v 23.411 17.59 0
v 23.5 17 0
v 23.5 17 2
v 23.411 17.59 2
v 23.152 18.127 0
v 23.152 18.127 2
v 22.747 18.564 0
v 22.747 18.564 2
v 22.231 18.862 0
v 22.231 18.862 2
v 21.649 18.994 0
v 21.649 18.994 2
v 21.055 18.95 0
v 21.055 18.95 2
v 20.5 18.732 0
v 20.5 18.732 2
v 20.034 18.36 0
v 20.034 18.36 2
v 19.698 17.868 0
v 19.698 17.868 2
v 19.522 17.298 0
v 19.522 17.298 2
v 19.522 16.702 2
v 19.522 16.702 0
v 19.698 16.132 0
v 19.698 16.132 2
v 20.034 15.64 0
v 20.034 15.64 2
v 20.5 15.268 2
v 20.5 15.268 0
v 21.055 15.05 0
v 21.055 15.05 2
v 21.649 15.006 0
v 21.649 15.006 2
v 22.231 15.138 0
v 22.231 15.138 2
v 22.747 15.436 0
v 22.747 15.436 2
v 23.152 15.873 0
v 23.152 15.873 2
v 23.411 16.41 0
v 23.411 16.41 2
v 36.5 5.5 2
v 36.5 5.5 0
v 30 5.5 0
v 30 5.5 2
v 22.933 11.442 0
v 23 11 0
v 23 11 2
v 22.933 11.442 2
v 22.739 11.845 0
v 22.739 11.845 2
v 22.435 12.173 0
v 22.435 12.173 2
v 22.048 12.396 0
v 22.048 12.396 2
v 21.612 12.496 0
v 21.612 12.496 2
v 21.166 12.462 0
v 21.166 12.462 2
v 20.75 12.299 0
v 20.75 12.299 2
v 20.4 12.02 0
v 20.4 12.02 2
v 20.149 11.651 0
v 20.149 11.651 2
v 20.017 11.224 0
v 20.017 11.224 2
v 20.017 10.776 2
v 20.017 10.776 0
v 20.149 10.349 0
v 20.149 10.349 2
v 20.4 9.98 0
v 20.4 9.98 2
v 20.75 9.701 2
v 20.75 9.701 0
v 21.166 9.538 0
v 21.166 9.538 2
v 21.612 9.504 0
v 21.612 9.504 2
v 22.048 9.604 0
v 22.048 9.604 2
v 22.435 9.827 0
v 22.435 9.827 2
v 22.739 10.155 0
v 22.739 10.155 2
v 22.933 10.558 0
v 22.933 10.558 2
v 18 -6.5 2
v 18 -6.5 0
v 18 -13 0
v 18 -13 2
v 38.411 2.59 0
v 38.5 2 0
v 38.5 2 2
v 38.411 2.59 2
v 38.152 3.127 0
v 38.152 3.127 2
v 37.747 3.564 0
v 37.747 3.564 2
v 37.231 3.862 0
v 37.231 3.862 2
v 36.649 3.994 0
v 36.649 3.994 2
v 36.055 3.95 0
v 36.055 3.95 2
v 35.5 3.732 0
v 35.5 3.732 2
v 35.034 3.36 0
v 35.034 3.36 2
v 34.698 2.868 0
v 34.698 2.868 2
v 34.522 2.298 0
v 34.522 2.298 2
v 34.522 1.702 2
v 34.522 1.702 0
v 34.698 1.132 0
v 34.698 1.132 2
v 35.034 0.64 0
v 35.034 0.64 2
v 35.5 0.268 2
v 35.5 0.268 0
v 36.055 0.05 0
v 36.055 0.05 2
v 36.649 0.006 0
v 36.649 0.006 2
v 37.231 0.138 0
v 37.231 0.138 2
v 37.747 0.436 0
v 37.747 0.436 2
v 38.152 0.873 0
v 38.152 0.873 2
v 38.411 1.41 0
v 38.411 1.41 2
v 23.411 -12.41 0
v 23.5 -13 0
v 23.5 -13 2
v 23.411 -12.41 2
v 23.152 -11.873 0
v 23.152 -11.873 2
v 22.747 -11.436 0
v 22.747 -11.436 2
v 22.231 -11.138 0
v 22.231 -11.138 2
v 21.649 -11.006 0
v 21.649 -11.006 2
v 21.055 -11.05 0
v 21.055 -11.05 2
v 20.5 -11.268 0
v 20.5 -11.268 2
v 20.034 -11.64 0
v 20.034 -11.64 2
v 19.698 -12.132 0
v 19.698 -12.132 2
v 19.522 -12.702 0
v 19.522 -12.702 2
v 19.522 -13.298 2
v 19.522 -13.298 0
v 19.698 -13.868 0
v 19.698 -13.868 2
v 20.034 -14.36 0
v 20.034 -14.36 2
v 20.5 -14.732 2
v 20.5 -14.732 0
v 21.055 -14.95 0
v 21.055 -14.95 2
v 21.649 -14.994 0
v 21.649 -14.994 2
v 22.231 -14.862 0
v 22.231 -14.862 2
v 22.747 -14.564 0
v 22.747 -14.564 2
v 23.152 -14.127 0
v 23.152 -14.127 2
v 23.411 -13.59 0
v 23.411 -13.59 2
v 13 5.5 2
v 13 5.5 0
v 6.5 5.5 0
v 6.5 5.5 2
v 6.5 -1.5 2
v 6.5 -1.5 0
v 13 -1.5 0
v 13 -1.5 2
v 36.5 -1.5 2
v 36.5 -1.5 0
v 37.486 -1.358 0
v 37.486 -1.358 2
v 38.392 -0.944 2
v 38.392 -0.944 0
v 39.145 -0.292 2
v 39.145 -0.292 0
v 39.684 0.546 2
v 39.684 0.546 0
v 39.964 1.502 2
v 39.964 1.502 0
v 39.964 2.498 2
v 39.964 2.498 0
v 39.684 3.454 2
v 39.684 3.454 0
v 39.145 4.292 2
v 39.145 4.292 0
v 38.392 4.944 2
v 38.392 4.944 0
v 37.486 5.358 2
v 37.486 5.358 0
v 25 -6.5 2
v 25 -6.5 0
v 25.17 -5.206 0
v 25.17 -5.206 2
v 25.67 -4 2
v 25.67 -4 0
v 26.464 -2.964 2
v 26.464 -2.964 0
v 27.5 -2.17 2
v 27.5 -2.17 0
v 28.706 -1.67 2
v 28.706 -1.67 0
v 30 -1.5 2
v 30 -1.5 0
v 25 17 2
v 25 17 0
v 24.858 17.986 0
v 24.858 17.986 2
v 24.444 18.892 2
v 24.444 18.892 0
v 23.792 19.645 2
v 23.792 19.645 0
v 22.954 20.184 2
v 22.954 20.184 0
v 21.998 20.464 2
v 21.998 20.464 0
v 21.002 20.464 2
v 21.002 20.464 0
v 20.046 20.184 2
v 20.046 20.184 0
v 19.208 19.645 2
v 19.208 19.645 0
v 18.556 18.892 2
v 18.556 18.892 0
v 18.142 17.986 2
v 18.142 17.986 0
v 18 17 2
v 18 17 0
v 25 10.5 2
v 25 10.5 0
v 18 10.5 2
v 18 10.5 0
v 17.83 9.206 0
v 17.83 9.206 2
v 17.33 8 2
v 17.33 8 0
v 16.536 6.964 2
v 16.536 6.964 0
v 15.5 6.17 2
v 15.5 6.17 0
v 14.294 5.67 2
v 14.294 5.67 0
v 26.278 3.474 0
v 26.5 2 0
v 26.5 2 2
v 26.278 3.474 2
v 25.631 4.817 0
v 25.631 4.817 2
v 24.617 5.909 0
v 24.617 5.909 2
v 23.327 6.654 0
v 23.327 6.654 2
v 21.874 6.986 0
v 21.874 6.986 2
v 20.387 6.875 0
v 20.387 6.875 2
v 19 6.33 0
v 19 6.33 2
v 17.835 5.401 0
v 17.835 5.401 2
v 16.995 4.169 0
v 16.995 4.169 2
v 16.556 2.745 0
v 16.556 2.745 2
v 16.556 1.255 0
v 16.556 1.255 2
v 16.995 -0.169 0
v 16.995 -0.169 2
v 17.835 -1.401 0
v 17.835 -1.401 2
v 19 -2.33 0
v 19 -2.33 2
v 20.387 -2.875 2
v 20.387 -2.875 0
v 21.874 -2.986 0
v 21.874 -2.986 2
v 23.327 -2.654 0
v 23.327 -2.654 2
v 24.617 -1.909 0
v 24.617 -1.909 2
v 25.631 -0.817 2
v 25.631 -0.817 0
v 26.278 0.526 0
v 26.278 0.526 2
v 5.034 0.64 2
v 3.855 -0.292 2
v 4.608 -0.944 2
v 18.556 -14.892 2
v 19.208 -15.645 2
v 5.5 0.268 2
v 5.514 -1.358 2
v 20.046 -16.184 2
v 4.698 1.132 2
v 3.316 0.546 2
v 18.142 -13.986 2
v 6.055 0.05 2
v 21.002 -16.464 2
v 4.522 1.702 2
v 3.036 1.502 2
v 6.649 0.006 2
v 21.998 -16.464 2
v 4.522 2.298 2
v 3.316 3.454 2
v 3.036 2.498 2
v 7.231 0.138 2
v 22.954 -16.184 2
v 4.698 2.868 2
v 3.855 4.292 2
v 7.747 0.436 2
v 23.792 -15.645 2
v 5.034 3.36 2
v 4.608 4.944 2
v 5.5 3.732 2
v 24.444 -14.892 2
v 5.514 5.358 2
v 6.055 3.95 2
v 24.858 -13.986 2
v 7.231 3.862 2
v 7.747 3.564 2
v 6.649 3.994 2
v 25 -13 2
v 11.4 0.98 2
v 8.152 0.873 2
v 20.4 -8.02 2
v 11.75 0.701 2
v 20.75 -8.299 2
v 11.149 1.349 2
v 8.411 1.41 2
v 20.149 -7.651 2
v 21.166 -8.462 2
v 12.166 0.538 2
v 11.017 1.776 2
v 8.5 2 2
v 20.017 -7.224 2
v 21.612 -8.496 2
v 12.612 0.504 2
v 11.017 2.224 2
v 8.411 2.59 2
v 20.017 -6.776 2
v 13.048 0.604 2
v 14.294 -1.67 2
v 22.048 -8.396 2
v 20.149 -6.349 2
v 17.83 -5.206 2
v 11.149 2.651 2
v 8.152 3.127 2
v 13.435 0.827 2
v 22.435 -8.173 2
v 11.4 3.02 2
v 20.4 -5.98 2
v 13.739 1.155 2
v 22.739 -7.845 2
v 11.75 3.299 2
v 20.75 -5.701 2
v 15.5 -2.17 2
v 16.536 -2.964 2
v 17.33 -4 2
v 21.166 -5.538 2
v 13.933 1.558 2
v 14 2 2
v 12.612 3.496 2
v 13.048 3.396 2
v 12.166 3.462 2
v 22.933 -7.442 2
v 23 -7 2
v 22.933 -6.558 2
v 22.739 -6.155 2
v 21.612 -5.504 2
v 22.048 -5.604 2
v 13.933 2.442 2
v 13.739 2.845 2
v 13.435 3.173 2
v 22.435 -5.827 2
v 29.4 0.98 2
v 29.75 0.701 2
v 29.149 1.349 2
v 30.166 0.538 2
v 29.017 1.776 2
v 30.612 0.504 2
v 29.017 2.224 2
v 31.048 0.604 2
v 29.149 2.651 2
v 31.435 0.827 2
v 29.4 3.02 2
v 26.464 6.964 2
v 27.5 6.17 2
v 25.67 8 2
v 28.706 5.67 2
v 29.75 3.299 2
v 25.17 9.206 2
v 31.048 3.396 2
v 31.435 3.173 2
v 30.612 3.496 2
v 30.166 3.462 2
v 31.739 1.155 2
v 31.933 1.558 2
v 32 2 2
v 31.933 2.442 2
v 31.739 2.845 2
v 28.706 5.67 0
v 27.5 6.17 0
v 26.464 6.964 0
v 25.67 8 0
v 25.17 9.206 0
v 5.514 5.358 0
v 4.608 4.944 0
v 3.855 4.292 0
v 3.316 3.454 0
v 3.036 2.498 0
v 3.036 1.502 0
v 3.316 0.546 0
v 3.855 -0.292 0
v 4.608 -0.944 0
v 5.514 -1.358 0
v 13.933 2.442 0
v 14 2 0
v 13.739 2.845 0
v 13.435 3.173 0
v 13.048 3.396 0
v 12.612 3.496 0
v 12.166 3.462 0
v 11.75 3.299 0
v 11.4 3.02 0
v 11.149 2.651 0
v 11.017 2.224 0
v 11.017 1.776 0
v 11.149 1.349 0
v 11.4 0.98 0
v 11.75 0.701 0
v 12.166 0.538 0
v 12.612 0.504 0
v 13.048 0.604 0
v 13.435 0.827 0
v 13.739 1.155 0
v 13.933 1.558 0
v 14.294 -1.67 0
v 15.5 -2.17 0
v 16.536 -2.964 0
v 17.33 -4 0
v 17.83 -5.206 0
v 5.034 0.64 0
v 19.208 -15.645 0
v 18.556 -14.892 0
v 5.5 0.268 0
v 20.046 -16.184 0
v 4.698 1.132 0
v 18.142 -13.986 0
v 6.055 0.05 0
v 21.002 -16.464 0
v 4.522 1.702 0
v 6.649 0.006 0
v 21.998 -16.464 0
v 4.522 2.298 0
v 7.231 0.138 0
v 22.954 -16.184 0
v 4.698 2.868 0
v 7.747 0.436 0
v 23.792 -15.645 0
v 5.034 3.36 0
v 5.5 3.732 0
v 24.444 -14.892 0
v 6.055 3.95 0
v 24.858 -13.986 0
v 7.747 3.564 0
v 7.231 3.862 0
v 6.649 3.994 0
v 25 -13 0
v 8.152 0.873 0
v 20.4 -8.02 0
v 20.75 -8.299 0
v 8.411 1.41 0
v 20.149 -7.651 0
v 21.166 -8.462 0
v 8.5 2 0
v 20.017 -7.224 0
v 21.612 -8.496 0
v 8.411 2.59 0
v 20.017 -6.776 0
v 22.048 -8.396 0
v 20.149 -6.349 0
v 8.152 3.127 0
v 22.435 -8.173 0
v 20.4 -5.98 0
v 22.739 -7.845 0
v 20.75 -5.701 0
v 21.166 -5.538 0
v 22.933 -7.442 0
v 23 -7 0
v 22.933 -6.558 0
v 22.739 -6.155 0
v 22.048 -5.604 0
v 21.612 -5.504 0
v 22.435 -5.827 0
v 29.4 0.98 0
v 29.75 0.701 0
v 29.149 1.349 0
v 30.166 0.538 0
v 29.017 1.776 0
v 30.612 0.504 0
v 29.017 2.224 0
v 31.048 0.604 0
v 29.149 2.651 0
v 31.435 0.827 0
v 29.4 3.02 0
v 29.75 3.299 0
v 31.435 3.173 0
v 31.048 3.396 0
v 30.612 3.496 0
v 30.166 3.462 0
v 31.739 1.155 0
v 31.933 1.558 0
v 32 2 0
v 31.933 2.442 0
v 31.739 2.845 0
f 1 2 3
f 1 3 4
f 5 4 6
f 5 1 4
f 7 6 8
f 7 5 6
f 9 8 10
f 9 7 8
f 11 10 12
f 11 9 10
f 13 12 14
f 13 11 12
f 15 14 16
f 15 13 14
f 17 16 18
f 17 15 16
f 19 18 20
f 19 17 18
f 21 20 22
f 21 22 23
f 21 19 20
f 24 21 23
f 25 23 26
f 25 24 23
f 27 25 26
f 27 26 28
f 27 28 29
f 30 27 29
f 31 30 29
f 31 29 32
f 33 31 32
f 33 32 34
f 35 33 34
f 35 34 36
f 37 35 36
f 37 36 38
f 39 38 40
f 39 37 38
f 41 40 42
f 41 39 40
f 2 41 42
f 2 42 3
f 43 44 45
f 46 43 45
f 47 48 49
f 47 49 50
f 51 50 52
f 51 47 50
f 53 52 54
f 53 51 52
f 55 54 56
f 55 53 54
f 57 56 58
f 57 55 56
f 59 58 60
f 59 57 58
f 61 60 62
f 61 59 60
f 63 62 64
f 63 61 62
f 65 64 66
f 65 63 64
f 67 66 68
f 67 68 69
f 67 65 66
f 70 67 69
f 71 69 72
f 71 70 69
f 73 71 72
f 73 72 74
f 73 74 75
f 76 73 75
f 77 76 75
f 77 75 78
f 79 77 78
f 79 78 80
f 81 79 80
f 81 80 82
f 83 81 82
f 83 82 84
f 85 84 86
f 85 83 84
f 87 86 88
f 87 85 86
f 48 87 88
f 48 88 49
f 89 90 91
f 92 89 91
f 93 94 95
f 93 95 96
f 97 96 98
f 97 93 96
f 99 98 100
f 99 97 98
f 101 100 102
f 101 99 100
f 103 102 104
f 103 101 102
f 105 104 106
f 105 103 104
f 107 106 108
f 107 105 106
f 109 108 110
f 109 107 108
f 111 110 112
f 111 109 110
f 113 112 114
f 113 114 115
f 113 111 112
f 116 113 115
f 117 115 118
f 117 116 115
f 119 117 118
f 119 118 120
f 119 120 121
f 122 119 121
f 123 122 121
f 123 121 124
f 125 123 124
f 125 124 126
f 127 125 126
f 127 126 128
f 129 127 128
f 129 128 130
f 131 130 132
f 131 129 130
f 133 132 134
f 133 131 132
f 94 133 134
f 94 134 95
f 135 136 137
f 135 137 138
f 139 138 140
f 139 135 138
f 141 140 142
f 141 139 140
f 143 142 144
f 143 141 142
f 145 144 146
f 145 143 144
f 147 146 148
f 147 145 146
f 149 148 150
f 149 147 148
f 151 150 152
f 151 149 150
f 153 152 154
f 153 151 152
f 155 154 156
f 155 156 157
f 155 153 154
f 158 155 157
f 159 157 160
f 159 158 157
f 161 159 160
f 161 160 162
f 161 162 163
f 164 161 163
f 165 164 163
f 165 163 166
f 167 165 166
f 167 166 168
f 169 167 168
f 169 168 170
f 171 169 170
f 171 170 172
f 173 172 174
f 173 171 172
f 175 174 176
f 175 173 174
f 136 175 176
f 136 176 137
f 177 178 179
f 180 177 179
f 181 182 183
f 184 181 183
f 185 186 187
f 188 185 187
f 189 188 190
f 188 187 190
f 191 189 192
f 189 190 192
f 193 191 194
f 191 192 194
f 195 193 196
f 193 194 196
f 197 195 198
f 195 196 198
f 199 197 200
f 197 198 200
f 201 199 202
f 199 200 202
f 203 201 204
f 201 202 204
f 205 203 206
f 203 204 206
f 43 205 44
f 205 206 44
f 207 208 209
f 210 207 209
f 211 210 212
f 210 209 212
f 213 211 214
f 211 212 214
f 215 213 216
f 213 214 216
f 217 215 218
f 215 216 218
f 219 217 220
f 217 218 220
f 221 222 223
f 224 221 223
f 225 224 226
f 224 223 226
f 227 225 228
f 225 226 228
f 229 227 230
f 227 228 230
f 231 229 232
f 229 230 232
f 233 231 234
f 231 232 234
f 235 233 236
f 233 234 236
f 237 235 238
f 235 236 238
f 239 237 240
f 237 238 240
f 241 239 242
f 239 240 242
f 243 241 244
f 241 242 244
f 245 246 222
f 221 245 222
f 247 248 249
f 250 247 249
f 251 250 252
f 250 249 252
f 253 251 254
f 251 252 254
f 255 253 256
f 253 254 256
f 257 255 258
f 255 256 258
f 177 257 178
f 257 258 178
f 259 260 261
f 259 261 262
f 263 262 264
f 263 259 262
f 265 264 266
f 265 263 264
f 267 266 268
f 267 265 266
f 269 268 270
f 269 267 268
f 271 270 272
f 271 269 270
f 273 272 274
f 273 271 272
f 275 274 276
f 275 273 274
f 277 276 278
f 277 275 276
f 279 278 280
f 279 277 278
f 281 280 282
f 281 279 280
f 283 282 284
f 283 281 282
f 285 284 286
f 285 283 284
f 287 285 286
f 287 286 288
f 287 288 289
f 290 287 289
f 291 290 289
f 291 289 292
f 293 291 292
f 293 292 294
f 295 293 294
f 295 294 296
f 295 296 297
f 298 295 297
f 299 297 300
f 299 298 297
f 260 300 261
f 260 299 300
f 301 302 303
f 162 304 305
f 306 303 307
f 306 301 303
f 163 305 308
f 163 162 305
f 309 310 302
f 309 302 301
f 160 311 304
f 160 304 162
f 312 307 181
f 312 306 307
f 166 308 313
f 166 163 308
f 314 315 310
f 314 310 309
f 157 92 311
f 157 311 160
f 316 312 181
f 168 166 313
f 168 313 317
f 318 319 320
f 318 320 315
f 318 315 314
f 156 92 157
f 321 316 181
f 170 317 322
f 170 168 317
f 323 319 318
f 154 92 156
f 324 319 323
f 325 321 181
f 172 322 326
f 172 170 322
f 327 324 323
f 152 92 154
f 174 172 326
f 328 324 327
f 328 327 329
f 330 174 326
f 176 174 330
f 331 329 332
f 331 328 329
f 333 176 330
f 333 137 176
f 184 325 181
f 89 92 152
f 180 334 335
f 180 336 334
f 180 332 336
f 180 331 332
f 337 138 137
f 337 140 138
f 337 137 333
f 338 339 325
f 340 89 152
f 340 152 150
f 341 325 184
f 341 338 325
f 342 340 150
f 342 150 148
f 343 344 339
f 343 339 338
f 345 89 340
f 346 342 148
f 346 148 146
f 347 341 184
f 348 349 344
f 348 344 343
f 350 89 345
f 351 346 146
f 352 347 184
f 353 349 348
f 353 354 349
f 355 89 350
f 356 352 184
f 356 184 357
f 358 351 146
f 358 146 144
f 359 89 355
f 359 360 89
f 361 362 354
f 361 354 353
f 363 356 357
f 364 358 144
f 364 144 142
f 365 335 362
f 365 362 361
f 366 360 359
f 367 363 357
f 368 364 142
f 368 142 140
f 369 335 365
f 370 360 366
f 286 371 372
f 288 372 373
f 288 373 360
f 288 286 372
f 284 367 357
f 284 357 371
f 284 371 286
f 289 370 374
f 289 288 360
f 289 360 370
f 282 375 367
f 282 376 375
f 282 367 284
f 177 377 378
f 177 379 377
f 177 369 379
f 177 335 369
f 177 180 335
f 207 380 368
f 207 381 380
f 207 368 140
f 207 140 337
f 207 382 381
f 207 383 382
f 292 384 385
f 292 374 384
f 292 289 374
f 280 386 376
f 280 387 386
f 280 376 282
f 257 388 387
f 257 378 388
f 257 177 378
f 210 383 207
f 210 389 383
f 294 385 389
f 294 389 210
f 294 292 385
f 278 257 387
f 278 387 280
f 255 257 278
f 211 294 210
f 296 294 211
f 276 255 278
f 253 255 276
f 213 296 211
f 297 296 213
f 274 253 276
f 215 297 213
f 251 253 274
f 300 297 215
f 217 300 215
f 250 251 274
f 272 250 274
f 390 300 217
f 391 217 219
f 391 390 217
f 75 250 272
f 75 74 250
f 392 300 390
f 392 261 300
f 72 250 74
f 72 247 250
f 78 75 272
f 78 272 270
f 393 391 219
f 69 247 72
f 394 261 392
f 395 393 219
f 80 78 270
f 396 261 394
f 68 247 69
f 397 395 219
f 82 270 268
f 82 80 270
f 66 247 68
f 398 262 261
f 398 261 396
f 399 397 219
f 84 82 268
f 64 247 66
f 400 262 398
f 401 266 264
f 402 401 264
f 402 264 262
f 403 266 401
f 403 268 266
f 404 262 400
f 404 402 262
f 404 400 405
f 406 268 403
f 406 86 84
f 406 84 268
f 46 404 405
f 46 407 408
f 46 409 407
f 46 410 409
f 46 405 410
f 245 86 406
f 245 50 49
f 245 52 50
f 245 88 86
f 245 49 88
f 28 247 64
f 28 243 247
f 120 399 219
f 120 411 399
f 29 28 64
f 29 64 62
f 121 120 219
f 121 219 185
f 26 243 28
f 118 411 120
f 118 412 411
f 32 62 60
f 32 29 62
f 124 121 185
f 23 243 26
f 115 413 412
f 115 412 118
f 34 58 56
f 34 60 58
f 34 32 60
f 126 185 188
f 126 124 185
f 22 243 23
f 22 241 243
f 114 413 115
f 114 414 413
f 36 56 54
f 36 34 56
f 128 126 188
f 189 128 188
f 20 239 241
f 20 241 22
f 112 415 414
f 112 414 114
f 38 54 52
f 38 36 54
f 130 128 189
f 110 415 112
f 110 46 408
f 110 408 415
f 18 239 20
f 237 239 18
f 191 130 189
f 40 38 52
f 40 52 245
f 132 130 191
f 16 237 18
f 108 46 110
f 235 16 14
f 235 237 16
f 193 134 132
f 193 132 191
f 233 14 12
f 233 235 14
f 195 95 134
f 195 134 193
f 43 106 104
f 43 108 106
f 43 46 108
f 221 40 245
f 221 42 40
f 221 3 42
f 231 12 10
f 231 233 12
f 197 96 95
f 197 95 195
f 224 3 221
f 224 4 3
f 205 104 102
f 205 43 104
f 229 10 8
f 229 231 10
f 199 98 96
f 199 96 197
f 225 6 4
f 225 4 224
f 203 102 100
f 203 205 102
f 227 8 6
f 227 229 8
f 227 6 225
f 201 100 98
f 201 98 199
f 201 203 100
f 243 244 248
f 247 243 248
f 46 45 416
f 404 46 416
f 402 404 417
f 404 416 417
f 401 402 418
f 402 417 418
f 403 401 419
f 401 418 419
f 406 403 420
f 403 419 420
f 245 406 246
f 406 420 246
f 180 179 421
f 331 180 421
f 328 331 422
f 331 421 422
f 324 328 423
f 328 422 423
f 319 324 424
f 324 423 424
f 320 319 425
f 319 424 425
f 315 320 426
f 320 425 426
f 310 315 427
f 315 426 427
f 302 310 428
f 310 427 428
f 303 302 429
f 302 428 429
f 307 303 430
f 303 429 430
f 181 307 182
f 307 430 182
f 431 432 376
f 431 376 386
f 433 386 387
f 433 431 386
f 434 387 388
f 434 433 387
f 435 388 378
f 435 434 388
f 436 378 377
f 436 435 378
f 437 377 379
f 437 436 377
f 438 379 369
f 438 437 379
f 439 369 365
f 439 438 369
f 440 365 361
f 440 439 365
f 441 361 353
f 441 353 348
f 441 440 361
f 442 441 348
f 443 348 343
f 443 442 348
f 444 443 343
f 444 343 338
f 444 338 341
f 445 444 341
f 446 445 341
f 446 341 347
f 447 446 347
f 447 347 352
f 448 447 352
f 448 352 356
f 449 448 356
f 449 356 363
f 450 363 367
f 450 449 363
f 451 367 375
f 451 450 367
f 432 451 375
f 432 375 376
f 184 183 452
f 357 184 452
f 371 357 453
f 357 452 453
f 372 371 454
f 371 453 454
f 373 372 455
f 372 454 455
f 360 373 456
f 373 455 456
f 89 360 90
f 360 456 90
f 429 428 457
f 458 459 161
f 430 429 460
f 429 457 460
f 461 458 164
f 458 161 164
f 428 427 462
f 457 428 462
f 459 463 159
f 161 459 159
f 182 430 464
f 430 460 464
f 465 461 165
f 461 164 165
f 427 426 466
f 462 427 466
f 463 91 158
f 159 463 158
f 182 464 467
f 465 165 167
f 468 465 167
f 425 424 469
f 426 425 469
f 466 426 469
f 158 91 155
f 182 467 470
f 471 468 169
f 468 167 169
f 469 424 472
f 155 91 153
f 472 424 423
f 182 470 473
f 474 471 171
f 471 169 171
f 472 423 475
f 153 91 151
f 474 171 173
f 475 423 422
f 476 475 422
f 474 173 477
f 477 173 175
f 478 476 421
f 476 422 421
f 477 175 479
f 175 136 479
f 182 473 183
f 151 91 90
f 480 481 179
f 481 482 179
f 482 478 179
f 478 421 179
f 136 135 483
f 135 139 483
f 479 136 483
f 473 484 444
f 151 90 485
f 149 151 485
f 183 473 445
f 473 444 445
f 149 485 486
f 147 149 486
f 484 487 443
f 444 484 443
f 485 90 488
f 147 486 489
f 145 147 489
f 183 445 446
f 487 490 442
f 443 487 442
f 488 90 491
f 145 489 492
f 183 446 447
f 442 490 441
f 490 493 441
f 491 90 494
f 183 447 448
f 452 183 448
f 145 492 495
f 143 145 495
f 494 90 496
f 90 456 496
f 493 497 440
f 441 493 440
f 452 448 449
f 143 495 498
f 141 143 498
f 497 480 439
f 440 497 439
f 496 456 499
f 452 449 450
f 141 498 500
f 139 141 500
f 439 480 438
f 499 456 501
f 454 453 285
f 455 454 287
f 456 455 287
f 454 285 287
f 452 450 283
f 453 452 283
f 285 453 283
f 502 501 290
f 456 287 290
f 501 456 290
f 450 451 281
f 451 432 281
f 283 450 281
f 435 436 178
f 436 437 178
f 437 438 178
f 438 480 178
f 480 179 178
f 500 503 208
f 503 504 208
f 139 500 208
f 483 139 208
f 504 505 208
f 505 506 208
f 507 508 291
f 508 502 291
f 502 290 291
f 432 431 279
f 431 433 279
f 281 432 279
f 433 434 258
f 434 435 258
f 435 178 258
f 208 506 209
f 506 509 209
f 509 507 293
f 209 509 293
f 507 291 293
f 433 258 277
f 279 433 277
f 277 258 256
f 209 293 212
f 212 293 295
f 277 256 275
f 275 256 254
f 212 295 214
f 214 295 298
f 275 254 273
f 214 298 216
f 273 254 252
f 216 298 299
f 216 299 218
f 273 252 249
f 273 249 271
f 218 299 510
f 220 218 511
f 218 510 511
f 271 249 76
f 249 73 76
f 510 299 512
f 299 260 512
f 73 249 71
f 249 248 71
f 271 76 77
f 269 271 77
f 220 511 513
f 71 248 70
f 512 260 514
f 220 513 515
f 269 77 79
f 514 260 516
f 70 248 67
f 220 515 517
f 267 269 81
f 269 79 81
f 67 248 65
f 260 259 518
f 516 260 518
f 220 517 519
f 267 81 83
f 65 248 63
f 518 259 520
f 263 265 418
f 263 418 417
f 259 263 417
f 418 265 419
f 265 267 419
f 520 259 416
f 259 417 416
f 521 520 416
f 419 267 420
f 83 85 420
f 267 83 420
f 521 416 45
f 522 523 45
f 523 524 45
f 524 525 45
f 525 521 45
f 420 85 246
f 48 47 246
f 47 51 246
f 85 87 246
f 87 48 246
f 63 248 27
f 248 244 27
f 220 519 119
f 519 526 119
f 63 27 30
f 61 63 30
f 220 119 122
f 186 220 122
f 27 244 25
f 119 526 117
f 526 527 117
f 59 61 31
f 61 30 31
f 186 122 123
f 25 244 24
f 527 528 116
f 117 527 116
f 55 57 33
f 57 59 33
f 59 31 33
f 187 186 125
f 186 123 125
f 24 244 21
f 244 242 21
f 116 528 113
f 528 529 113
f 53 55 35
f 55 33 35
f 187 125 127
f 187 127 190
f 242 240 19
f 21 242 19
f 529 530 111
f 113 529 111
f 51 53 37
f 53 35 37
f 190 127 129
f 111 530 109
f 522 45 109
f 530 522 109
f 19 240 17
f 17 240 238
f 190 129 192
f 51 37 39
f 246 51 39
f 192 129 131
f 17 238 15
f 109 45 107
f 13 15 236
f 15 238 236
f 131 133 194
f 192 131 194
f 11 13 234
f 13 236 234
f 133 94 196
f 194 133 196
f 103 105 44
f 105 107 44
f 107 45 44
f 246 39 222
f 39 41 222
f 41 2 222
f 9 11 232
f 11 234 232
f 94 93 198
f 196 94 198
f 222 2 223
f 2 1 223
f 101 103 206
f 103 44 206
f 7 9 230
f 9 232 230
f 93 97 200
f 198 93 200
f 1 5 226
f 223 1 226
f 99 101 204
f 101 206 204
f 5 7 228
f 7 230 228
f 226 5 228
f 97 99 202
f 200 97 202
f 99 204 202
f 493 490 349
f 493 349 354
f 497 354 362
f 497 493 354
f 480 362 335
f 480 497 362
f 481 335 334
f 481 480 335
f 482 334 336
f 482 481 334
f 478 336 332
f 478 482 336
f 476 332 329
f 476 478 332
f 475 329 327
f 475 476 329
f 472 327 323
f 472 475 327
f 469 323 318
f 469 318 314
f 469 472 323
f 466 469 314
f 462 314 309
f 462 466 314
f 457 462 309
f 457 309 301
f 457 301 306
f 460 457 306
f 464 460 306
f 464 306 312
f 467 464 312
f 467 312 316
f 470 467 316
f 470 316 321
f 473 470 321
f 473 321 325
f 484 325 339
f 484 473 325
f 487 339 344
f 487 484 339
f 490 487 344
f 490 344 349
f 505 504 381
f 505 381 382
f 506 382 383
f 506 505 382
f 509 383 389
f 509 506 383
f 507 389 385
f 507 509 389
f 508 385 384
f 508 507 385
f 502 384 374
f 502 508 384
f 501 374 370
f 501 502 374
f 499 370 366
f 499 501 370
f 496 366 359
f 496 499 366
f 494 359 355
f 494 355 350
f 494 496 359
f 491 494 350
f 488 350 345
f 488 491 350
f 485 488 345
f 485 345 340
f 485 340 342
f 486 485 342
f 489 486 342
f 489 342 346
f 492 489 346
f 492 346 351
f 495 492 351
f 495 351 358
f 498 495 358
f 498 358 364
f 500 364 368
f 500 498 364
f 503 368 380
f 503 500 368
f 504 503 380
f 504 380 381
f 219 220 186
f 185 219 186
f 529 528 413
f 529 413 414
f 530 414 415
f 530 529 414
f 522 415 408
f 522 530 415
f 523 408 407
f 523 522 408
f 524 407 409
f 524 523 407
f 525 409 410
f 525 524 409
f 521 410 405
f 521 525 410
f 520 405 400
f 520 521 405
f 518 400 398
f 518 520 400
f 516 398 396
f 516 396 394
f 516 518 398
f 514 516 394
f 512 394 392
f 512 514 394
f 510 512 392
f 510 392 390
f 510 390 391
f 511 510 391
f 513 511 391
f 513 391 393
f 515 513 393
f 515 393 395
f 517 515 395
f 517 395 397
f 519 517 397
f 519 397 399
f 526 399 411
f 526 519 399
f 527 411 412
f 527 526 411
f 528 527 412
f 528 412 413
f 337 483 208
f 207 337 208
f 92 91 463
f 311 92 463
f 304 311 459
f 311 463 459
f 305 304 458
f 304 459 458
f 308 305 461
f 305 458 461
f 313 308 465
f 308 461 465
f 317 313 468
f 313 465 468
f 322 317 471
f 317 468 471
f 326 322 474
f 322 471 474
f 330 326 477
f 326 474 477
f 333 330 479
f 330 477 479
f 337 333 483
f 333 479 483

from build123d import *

# Parameters (mm, degrees)
ESQUISSE1_R        = 5
ESQUISSE1_R_2      = 1.5
ESQUISSE1_R_3      = 2
BOSS_EXTRU_1_DEPTH = 2


with BuildPart() as part:
    # Esquisse1 → Boss.-Extru.1 (new body)
    with BuildSketch(Plane.XY):
        with BuildLine():
            Line((18, -6.5), (18, -13))
            ThreePointArc((18, -13), (21.5, -16.5), (25, -13))
            Line((25, -13), (25, -6.5))
            ThreePointArc((25, -6.5), (26.464466094, -2.964466094), (30, -1.5))
            Line((30, -1.5), (36.5, -1.5))
            ThreePointArc((36.5, -1.5), (40, 2), (36.5, 5.5))
            Line((36.5, 5.5), (30, 5.5))
            ThreePointArc((30, 5.5), (26.464466094, 6.964466094), (25, 10.5))
            Line((25, 10.5), (25, 17))
            ThreePointArc((25, 17), (21.5, 20.5), (18, 17))
            Line((18, 17), (18, 10.5))
            ThreePointArc((18, 10.5), (16.535533906, 6.964466094), (13, 5.5))
            Line((13, 5.5), (6.5, 5.5))
            ThreePointArc((6.5, 5.5), (3, 2), (6.5, -1.5))
            Line((6.5, -1.5), (13, -1.5))
            ThreePointArc((13, -1.5), (16.535533906, -2.964466094), (18, -6.5))
        make_face()
        with Locations((21.5, 2)):
            Circle(ESQUISSE1_R, mode=Mode.SUBTRACT)
        with Locations((12.5, 2)):
            Circle(ESQUISSE1_R_2, mode=Mode.SUBTRACT)
        with Locations((6.5, 2)):
            Circle(ESQUISSE1_R_3, mode=Mode.SUBTRACT)
        with Locations((21.5, 17)):
            Circle(ESQUISSE1_R_3, mode=Mode.SUBTRACT)
        with Locations((21.5, 11)):
            Circle(ESQUISSE1_R_2, mode=Mode.SUBTRACT)
        with Locations((36.5, 2)):
            Circle(ESQUISSE1_R_3, mode=Mode.SUBTRACT)
        with Locations((30.5, 2)):
            Circle(ESQUISSE1_R_2, mode=Mode.SUBTRACT)
        with Locations((21.5, -13)):
            Circle(ESQUISSE1_R_3, mode=Mode.SUBTRACT)
        with Locations((21.5, -7)):
            Circle(ESQUISSE1_R_2, mode=Mode.SUBTRACT)
    extrude(amount=BOSS_EXTRU_1_DEPTH)


solid = part.part
